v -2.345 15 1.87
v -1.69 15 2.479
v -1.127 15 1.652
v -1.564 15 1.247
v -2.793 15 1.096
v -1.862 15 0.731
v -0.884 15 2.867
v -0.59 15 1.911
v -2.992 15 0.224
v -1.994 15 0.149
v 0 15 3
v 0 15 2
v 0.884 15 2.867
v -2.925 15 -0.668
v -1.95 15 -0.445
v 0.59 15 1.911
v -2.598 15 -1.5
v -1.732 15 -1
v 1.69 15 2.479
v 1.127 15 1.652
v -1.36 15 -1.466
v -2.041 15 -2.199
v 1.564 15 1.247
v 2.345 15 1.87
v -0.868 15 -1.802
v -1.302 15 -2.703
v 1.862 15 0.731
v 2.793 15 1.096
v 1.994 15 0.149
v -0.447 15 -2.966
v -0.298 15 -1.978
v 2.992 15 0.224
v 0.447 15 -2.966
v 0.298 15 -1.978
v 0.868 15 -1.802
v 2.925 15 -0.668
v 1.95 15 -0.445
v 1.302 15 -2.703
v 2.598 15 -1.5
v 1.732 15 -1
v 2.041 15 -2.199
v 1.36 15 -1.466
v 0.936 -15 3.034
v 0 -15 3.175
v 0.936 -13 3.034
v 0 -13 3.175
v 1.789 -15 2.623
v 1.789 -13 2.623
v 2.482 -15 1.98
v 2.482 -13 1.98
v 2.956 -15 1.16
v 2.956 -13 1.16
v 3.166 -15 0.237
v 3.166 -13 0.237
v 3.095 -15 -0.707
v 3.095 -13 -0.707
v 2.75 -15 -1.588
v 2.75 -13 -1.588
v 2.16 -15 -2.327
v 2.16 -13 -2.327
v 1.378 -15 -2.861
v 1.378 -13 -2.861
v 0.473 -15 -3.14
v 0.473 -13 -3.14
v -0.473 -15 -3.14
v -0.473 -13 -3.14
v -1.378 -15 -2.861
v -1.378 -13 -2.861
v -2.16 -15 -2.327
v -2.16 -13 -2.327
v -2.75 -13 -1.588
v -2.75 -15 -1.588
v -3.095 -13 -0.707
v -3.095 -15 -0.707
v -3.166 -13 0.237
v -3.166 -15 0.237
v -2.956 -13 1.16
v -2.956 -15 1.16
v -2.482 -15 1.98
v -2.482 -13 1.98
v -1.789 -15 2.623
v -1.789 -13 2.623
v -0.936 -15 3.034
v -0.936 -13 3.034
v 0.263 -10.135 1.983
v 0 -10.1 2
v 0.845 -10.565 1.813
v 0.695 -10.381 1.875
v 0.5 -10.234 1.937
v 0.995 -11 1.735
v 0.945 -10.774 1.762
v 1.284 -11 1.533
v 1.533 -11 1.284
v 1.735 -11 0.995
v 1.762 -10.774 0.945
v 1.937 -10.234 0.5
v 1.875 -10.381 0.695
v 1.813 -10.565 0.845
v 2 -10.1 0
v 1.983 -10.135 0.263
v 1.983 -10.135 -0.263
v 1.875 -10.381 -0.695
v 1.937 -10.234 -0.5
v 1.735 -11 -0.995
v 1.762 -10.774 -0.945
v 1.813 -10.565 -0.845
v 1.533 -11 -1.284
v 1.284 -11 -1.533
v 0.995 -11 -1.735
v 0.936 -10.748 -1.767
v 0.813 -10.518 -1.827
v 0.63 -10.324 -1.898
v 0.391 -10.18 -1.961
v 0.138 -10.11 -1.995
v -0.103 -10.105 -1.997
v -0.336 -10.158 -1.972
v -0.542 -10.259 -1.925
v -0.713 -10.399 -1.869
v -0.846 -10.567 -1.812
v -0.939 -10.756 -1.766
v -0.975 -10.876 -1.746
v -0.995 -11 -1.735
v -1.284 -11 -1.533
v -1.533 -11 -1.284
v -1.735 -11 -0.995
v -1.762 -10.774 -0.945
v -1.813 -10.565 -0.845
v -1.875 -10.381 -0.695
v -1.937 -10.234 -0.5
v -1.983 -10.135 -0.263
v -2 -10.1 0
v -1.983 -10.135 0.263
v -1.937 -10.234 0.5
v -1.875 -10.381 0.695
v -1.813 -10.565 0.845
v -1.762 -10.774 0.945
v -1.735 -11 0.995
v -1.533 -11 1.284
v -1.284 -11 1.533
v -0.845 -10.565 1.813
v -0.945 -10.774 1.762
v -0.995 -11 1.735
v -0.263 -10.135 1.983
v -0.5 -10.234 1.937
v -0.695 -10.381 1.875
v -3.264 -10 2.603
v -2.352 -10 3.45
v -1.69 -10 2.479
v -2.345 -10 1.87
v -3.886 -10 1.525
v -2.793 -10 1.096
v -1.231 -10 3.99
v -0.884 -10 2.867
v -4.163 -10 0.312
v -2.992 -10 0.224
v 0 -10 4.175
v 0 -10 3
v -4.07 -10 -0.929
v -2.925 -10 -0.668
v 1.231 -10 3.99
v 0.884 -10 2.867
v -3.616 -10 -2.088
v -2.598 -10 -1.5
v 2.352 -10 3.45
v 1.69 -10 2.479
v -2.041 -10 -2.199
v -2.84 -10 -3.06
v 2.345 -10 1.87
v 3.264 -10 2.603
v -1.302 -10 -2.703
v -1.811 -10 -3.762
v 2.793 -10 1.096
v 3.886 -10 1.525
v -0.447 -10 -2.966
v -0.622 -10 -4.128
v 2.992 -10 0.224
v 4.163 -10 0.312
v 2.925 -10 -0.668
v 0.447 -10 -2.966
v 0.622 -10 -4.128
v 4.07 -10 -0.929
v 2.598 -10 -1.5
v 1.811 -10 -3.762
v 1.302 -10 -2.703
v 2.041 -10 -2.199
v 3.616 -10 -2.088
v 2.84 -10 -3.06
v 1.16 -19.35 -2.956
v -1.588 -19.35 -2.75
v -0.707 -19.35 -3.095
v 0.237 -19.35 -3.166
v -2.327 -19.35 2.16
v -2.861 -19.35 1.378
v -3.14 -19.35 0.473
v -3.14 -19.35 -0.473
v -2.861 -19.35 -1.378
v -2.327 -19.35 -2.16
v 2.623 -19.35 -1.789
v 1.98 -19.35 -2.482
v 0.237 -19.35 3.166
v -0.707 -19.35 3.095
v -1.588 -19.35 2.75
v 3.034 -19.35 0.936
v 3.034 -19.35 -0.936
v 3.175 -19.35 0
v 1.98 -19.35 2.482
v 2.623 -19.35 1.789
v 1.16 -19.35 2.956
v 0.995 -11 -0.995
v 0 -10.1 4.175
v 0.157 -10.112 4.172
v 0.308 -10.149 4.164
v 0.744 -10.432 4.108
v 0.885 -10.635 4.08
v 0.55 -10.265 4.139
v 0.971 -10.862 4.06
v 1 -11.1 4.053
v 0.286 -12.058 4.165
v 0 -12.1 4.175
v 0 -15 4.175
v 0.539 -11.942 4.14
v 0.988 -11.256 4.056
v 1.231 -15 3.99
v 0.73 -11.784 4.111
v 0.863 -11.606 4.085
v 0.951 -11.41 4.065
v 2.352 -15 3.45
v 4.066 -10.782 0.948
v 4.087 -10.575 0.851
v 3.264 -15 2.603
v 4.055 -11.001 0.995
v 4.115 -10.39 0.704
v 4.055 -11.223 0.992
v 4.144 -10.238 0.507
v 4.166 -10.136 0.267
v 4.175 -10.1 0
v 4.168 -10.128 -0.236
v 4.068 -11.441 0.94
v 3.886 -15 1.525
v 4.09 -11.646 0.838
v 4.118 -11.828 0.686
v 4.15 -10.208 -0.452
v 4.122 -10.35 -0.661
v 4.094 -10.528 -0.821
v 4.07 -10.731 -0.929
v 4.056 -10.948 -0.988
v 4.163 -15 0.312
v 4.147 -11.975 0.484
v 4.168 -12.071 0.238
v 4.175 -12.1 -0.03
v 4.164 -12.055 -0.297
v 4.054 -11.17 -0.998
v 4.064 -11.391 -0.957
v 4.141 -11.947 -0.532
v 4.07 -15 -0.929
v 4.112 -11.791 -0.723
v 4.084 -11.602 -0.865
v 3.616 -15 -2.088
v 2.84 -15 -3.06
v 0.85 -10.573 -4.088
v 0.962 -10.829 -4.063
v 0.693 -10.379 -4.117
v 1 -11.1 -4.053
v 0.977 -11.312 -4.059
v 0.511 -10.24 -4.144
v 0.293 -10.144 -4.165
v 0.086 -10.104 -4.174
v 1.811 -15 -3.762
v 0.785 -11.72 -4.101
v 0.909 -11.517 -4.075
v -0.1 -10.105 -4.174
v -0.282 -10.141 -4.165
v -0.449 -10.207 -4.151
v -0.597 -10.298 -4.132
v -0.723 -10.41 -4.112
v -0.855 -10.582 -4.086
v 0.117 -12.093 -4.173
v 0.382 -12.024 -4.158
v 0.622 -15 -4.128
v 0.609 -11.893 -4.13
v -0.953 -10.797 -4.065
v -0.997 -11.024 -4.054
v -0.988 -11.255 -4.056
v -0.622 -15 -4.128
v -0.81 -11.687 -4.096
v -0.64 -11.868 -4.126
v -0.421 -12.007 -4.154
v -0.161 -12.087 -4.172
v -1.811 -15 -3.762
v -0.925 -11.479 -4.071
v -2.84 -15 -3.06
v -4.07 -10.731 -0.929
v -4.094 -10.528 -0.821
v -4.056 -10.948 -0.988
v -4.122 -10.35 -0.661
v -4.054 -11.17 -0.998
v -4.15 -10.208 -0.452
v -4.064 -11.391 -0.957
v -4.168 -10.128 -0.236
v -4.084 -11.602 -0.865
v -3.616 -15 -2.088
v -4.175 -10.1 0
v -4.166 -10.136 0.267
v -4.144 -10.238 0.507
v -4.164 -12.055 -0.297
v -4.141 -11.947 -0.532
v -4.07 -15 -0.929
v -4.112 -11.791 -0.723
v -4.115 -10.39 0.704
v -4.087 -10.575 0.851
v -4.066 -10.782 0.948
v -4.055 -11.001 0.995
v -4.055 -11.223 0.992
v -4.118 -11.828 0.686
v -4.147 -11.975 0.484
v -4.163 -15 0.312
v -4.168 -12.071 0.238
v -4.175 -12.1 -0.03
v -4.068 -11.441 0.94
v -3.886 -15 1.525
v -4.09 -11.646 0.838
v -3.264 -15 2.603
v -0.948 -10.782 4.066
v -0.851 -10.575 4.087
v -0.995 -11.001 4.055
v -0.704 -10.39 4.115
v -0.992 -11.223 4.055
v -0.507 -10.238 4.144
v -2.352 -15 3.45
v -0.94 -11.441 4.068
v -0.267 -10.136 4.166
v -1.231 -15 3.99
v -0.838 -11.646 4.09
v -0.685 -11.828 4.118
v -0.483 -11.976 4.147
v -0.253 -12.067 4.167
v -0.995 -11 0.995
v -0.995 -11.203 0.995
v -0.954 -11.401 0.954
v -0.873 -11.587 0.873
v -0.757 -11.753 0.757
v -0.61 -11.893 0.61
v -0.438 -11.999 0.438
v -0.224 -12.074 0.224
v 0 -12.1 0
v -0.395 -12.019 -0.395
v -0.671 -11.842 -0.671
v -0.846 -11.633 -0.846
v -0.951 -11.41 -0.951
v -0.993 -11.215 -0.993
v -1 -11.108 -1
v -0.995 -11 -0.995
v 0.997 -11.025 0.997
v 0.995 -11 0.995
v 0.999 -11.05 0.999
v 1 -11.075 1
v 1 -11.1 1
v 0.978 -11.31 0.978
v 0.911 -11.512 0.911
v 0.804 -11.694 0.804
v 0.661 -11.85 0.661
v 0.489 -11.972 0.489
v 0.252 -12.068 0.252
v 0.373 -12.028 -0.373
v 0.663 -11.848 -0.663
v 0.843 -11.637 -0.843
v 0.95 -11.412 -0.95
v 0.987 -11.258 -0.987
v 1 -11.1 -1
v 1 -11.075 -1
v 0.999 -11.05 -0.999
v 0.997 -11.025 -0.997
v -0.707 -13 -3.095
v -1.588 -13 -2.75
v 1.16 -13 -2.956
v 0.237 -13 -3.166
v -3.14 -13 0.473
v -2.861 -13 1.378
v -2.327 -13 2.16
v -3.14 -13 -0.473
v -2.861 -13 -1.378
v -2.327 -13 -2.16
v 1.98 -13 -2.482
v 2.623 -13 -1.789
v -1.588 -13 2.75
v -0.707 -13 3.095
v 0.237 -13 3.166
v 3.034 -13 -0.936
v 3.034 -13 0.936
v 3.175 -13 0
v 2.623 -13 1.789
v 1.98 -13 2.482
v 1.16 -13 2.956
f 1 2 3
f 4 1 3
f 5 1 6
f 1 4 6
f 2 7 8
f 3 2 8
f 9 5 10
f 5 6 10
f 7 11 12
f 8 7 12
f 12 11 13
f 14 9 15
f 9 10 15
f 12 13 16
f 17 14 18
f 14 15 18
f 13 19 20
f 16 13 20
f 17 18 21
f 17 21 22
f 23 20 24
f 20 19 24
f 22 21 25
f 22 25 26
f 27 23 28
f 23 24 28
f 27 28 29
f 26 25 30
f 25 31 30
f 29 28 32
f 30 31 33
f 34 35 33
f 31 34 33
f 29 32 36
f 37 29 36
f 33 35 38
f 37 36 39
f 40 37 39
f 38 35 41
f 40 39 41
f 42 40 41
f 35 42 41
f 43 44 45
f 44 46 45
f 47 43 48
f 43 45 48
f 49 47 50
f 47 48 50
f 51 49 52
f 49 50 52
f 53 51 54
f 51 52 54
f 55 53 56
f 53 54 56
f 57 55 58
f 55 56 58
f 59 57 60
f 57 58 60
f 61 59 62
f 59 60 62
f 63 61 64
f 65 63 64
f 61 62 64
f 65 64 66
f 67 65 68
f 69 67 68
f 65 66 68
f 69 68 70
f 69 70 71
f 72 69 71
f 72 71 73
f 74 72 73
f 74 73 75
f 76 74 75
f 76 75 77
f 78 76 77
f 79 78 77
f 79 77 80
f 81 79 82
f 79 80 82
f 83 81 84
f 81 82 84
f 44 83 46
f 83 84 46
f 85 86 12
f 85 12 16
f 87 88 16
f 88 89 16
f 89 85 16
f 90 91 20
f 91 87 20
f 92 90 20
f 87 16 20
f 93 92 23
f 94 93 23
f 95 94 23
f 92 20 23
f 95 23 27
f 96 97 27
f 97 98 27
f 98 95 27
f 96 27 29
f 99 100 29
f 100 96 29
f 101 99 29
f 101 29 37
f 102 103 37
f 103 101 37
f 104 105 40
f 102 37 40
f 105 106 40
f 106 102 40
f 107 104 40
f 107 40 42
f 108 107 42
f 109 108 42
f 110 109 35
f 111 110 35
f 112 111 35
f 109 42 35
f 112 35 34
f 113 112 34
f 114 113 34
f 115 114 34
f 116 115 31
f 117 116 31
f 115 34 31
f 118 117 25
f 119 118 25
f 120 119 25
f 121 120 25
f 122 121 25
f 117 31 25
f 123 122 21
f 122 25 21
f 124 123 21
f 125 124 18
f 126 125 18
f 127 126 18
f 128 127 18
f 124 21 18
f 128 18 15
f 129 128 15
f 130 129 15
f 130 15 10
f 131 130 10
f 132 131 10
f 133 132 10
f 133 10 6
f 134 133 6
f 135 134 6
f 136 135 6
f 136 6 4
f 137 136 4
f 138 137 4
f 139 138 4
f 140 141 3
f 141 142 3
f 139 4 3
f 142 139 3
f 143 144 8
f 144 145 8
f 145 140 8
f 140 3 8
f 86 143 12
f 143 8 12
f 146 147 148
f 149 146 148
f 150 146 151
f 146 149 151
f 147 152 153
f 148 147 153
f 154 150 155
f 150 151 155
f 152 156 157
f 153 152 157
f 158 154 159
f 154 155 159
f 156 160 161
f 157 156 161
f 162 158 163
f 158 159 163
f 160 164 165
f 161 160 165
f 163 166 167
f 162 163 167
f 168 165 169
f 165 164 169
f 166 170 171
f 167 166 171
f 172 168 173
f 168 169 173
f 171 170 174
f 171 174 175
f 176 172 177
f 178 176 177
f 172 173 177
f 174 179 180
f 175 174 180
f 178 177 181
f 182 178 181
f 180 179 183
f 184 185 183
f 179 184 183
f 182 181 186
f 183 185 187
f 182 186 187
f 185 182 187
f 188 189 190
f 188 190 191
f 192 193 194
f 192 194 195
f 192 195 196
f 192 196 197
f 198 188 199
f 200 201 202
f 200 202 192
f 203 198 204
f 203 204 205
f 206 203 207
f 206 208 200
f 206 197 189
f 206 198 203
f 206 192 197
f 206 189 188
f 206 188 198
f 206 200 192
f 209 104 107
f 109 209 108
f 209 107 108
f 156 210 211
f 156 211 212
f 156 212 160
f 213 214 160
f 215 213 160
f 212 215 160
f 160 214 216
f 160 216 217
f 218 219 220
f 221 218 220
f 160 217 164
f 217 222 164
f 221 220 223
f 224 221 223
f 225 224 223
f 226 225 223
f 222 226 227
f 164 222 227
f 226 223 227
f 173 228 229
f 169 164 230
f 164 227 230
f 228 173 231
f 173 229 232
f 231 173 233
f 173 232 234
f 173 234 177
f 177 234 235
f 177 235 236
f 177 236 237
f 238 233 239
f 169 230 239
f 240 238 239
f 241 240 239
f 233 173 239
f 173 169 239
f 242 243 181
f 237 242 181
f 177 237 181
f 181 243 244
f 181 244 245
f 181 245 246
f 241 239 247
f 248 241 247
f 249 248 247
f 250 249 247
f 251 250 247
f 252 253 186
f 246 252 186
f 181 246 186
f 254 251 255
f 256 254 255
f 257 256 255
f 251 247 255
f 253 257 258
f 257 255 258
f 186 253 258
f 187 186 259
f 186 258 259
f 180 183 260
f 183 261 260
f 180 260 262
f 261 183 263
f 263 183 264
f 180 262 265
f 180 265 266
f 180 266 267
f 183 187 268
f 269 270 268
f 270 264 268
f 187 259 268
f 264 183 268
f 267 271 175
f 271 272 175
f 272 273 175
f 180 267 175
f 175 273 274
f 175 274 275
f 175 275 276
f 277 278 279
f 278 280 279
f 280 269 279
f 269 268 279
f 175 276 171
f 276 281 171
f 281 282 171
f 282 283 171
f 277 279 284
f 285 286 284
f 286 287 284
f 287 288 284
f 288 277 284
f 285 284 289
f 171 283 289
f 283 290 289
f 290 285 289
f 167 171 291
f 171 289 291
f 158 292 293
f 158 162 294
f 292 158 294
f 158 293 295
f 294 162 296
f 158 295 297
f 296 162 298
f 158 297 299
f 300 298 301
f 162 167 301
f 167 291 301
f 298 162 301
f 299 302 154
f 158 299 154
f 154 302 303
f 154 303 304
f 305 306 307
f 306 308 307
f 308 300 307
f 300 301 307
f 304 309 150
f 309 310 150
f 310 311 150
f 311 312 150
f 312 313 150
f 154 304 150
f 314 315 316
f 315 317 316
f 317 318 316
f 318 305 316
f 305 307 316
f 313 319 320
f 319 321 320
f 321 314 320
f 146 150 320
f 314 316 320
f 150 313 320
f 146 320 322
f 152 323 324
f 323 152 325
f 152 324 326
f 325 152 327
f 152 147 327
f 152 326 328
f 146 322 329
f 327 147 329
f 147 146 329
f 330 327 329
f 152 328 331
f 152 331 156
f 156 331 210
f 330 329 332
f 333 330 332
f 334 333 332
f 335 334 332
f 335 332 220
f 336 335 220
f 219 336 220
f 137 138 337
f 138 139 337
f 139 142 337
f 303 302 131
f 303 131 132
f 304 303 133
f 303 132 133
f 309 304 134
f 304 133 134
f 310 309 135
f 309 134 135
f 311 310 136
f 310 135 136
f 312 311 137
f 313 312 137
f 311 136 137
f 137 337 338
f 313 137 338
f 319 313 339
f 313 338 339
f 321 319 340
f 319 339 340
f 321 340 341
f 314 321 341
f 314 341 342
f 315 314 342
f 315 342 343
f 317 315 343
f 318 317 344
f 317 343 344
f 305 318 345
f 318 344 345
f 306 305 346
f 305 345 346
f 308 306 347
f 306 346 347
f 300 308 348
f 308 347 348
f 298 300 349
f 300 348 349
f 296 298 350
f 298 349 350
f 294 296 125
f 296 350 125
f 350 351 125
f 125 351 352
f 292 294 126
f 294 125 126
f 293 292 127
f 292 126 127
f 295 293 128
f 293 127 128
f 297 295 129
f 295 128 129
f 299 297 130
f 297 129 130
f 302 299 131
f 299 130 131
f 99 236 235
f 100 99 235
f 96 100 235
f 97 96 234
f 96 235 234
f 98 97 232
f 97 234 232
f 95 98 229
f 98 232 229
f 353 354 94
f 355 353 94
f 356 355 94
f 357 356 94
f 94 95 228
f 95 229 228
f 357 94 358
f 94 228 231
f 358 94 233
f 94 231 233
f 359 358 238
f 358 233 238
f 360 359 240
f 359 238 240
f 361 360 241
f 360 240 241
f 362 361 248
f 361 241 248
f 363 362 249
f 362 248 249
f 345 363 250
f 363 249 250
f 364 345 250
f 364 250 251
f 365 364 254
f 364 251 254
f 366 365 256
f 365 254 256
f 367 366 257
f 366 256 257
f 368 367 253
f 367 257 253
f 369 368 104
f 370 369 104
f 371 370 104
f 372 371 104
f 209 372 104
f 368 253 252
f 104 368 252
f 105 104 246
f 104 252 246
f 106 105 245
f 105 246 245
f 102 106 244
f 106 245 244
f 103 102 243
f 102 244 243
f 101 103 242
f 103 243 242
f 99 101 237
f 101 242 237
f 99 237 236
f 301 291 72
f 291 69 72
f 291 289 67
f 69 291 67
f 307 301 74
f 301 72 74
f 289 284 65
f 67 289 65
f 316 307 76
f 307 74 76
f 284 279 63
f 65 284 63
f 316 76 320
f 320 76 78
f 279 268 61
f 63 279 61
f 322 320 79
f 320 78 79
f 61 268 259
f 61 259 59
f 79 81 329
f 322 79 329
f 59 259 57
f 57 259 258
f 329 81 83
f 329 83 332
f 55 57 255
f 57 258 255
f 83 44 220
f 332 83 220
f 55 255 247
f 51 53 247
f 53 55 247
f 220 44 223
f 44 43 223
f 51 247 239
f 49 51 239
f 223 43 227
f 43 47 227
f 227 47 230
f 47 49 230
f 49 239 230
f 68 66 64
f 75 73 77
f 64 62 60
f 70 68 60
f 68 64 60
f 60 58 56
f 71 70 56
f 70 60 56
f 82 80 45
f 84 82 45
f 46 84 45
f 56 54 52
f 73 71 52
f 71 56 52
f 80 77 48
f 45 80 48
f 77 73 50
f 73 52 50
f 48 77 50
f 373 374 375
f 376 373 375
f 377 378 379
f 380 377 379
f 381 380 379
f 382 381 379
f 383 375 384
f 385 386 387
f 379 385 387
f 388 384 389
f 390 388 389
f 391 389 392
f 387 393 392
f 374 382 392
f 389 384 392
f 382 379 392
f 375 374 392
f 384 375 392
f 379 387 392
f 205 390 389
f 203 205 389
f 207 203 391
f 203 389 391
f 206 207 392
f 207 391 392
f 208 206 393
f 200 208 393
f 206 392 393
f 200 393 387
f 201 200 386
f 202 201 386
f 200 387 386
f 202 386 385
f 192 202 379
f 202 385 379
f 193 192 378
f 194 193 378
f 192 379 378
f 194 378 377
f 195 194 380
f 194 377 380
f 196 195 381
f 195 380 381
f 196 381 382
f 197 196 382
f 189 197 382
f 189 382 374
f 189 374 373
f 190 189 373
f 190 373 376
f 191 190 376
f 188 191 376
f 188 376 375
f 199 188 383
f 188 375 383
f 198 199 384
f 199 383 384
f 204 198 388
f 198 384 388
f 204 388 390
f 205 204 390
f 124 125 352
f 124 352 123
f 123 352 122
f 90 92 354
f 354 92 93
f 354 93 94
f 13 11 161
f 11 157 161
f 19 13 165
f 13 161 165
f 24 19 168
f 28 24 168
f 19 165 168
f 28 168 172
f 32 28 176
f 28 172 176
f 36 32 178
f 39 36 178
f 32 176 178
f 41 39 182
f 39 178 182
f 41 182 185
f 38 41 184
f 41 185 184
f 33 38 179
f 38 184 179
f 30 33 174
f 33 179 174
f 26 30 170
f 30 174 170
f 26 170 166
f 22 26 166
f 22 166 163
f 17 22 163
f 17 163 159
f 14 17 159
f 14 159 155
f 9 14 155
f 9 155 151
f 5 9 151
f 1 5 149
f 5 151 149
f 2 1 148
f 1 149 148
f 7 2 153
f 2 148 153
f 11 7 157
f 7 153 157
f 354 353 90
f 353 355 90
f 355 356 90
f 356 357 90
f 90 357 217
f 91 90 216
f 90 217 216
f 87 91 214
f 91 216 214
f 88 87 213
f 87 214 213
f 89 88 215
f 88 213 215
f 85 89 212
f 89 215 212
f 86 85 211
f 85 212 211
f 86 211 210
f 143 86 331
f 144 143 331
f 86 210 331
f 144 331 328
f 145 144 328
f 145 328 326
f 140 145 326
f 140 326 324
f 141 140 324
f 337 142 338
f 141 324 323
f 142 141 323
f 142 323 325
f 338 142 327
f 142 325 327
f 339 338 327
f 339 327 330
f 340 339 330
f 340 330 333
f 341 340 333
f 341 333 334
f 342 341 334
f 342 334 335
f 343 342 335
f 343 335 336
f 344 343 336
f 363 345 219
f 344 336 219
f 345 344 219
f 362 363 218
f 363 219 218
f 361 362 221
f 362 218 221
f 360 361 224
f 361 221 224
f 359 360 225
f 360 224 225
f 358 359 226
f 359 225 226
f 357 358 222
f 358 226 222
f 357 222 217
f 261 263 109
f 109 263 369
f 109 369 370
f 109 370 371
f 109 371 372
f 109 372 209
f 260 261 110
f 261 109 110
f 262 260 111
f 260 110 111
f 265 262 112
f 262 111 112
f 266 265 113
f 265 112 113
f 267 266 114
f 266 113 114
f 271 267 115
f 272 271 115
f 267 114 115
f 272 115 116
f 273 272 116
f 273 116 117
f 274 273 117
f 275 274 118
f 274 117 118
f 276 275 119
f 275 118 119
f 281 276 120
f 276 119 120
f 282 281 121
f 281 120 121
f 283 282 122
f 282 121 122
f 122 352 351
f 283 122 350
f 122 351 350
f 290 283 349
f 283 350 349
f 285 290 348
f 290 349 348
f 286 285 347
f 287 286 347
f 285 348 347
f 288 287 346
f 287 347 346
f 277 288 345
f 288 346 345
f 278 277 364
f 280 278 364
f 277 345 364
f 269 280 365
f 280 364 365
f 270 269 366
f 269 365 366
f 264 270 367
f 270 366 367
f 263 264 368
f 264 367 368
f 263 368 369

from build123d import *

# Parameters (mm, degrees)
F2_R     = 1
F3_DEPTH = 12.5
F4_R     = 1
F5_DEPTH = 12.5
F6_R     = 3.175
F7_DEPTH = 6.35


with BuildPart() as f1:
    # F0 (on Right) → F1 (revolve)
    with BuildSketch(Plane.YZ):
        Polygon((15, 2), (15, 3), (3.5, 3), (2.5, 3), (-4.5, 3), (-5.5, 3), (-10, 3), (-10, 3.175), (-10, 4.175), (-15, 4.175), (-15, 3.175), (-13, 3.175), (-13, 3), (-13, 0), (-11, 0), (-11, 2), align=None)
    revolve(axis=Axis((0, -5.9435404837, 0), (0, 1, 0)))

    # F2 (on Right) → F3 (cut, symmetric)
    with BuildSketch(Plane.YZ):
        with Locations((-11.1, 0)):
            Circle(F2_R)
    extrude(amount=F3_DEPTH, both=True, mode=Mode.SUBTRACT)

    # F4 (on Top) → F5 (cut, symmetric)
    with BuildSketch(Plane.XY):
        with Locations((0, -11.1)):
            Circle(F4_R)
    extrude(amount=F5_DEPTH, both=True, mode=Mode.SUBTRACT)


with BuildPart() as f7:
    # F6 (on face) → F7 (new body)
    with BuildSketch(Plane.XZ.offset(13)):
        Circle(F6_R)
    extrude(amount=F7_DEPTH)


solid = Compound([f1.part, f7.part])
